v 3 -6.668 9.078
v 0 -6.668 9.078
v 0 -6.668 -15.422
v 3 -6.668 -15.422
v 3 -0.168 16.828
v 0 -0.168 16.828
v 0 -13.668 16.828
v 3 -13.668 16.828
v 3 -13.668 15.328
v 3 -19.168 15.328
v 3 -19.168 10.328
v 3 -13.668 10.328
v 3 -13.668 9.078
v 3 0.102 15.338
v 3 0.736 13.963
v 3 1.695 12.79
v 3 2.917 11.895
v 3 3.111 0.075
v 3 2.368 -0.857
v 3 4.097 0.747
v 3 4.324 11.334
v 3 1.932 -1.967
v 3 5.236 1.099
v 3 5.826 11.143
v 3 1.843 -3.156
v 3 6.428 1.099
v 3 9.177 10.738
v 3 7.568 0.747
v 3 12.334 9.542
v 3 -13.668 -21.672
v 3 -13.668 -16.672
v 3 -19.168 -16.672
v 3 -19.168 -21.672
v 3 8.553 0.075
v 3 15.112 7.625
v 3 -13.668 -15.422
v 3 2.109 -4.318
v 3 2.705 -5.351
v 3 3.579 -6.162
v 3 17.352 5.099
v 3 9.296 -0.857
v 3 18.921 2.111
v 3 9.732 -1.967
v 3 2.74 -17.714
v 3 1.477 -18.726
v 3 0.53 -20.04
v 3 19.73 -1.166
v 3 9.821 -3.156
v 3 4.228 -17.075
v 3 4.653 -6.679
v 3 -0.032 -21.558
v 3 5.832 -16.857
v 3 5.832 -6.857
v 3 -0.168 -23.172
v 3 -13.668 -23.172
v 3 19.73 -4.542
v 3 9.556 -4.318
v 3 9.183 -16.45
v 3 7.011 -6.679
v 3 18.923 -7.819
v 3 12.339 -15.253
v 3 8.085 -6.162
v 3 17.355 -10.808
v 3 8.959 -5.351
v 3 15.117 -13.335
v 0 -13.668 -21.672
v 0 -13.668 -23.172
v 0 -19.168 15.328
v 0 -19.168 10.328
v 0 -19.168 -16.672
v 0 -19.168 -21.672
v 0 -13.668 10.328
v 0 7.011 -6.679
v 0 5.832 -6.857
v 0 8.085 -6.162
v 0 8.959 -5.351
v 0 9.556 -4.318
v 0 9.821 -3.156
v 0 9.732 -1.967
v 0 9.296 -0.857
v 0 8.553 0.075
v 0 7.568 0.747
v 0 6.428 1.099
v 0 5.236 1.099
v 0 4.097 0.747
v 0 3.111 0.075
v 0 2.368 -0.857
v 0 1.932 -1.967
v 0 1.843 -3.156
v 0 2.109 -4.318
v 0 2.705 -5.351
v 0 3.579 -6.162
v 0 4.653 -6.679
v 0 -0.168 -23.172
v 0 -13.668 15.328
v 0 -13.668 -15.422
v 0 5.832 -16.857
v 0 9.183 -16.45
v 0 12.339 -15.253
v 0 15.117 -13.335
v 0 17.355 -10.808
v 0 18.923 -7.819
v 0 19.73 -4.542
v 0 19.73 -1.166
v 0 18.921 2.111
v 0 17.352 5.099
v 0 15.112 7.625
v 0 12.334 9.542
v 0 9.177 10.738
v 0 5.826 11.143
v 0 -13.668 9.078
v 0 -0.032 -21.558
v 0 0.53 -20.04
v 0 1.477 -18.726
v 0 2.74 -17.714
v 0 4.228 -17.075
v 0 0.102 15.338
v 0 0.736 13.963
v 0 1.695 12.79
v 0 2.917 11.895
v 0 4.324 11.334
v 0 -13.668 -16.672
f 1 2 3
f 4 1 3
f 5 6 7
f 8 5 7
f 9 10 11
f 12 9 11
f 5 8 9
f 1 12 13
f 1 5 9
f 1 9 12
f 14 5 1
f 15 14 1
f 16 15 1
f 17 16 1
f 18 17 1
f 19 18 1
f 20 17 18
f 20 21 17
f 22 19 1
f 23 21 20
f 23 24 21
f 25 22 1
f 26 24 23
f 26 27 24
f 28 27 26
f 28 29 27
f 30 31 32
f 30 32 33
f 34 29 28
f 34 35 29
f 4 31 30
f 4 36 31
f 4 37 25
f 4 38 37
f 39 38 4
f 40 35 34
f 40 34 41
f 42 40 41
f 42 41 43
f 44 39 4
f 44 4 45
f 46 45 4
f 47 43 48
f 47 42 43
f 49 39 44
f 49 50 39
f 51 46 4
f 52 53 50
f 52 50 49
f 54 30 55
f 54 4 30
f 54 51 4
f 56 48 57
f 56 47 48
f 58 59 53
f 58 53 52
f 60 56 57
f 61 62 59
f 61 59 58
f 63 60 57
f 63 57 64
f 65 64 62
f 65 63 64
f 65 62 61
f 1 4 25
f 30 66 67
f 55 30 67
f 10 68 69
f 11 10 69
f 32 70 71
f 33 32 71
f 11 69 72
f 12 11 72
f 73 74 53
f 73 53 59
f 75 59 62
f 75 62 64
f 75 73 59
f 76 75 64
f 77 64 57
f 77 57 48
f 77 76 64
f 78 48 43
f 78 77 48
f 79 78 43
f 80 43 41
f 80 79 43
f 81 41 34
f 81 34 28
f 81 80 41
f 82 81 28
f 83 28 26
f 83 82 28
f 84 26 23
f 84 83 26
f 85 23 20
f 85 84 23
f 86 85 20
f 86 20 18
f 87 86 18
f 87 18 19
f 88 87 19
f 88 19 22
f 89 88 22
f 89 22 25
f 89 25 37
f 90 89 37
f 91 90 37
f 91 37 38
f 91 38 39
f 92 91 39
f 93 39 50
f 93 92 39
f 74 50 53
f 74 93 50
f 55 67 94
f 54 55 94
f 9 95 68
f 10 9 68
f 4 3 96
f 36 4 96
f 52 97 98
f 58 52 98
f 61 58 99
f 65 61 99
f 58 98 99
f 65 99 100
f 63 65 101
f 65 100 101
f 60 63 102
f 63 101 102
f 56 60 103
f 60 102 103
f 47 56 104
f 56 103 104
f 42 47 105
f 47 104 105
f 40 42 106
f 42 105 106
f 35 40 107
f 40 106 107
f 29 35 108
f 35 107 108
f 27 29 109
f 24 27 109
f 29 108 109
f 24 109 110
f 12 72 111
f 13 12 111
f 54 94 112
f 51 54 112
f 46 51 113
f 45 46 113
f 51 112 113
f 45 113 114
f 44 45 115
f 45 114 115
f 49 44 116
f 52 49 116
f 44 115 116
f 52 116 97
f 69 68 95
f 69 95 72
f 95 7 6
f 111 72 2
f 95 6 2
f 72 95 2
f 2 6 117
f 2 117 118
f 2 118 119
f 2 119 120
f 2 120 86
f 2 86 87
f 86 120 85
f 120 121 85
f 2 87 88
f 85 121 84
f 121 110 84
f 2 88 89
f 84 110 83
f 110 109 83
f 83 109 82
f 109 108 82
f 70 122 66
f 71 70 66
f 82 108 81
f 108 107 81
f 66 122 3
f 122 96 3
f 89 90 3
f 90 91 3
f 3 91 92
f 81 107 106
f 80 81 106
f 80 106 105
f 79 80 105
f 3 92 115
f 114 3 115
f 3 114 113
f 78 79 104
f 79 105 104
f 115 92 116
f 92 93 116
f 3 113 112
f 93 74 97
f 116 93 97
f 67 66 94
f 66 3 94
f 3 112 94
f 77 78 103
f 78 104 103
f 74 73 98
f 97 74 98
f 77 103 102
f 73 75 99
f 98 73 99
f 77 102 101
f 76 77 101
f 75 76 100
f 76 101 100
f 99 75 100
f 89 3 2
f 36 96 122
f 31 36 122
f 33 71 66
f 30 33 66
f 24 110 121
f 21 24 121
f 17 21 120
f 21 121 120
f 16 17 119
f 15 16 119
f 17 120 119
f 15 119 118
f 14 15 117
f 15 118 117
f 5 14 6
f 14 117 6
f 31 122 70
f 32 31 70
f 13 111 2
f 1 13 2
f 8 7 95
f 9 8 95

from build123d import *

# Parameters (mm, degrees)
SKETCH3_R           = 4
BOSS_EXTRUDE1_DEPTH = 3


with BuildPart() as part:
    # Sketch3 → Boss-Extrude1 (new body)
    with BuildSketch(Plane(origin=(0, 0, 0), x_dir=(0, 0, -1), z_dir=(1, 0, 0))):
        with BuildLine():
            Line((-16.828358209, -0.167910448), (-16.828358209, -13.667910448))
            Line((-16.828358209, -13.667910448), (-15.328358209, -13.667910448))
            Line((-15.328358209, -13.667910448), (-15.328358209, -19.167910448))
            Line((-15.328358209, -19.167910448), (-10.328358209, -19.167910448))
            Line((-10.328358209, -19.167910448), (-10.328358209, -13.667910448))
            Line((-10.328358209, -13.667910448), (-9.078358209, -13.667910448))
            Line((-9.078358209, -13.667910448), (-9.078358209, -6.667910448))
            Line((-9.078358209, -6.667910448), (15.421641791, -6.667910448))
            Line((15.421641791, -6.667910448), (15.421641791, -13.667910448))
            Line((15.421641791, -13.667910448), (16.671641791, -13.667910448))
            Line((16.671641791, -13.667910448), (16.671641791, -19.167910448))
            Line((16.671641791, -19.167910448), (21.671641791, -19.167910448))
            Line((21.671641791, -19.167910448), (21.671641791, -13.667910448))
            Line((21.671641791, -13.667910448), (23.171641791, -13.667910448))
            Line((23.171641791, -13.667910448), (23.171641791, -0.167910448))
            ThreePointArc((23.171641791, -0.167910448), (18.726397941, 1.476700456), (16.856765964, 5.832089552))
            ThreePointArc((16.856765964, 5.832089552), (2.853872221, 19.832089253), (-11.14323284, 5.826302065))
            ThreePointArc((-11.14323284, 5.826302065), (-12.789836747, 1.694905763), (-16.828358209, -0.167910448))
        make_face()
        with Locations((2.856765964, 5.832089552)):
            Circle(SKETCH3_R, mode=Mode.SUBTRACT)
    extrude(amount=BOSS_EXTRUDE1_DEPTH)


solid = part.part
